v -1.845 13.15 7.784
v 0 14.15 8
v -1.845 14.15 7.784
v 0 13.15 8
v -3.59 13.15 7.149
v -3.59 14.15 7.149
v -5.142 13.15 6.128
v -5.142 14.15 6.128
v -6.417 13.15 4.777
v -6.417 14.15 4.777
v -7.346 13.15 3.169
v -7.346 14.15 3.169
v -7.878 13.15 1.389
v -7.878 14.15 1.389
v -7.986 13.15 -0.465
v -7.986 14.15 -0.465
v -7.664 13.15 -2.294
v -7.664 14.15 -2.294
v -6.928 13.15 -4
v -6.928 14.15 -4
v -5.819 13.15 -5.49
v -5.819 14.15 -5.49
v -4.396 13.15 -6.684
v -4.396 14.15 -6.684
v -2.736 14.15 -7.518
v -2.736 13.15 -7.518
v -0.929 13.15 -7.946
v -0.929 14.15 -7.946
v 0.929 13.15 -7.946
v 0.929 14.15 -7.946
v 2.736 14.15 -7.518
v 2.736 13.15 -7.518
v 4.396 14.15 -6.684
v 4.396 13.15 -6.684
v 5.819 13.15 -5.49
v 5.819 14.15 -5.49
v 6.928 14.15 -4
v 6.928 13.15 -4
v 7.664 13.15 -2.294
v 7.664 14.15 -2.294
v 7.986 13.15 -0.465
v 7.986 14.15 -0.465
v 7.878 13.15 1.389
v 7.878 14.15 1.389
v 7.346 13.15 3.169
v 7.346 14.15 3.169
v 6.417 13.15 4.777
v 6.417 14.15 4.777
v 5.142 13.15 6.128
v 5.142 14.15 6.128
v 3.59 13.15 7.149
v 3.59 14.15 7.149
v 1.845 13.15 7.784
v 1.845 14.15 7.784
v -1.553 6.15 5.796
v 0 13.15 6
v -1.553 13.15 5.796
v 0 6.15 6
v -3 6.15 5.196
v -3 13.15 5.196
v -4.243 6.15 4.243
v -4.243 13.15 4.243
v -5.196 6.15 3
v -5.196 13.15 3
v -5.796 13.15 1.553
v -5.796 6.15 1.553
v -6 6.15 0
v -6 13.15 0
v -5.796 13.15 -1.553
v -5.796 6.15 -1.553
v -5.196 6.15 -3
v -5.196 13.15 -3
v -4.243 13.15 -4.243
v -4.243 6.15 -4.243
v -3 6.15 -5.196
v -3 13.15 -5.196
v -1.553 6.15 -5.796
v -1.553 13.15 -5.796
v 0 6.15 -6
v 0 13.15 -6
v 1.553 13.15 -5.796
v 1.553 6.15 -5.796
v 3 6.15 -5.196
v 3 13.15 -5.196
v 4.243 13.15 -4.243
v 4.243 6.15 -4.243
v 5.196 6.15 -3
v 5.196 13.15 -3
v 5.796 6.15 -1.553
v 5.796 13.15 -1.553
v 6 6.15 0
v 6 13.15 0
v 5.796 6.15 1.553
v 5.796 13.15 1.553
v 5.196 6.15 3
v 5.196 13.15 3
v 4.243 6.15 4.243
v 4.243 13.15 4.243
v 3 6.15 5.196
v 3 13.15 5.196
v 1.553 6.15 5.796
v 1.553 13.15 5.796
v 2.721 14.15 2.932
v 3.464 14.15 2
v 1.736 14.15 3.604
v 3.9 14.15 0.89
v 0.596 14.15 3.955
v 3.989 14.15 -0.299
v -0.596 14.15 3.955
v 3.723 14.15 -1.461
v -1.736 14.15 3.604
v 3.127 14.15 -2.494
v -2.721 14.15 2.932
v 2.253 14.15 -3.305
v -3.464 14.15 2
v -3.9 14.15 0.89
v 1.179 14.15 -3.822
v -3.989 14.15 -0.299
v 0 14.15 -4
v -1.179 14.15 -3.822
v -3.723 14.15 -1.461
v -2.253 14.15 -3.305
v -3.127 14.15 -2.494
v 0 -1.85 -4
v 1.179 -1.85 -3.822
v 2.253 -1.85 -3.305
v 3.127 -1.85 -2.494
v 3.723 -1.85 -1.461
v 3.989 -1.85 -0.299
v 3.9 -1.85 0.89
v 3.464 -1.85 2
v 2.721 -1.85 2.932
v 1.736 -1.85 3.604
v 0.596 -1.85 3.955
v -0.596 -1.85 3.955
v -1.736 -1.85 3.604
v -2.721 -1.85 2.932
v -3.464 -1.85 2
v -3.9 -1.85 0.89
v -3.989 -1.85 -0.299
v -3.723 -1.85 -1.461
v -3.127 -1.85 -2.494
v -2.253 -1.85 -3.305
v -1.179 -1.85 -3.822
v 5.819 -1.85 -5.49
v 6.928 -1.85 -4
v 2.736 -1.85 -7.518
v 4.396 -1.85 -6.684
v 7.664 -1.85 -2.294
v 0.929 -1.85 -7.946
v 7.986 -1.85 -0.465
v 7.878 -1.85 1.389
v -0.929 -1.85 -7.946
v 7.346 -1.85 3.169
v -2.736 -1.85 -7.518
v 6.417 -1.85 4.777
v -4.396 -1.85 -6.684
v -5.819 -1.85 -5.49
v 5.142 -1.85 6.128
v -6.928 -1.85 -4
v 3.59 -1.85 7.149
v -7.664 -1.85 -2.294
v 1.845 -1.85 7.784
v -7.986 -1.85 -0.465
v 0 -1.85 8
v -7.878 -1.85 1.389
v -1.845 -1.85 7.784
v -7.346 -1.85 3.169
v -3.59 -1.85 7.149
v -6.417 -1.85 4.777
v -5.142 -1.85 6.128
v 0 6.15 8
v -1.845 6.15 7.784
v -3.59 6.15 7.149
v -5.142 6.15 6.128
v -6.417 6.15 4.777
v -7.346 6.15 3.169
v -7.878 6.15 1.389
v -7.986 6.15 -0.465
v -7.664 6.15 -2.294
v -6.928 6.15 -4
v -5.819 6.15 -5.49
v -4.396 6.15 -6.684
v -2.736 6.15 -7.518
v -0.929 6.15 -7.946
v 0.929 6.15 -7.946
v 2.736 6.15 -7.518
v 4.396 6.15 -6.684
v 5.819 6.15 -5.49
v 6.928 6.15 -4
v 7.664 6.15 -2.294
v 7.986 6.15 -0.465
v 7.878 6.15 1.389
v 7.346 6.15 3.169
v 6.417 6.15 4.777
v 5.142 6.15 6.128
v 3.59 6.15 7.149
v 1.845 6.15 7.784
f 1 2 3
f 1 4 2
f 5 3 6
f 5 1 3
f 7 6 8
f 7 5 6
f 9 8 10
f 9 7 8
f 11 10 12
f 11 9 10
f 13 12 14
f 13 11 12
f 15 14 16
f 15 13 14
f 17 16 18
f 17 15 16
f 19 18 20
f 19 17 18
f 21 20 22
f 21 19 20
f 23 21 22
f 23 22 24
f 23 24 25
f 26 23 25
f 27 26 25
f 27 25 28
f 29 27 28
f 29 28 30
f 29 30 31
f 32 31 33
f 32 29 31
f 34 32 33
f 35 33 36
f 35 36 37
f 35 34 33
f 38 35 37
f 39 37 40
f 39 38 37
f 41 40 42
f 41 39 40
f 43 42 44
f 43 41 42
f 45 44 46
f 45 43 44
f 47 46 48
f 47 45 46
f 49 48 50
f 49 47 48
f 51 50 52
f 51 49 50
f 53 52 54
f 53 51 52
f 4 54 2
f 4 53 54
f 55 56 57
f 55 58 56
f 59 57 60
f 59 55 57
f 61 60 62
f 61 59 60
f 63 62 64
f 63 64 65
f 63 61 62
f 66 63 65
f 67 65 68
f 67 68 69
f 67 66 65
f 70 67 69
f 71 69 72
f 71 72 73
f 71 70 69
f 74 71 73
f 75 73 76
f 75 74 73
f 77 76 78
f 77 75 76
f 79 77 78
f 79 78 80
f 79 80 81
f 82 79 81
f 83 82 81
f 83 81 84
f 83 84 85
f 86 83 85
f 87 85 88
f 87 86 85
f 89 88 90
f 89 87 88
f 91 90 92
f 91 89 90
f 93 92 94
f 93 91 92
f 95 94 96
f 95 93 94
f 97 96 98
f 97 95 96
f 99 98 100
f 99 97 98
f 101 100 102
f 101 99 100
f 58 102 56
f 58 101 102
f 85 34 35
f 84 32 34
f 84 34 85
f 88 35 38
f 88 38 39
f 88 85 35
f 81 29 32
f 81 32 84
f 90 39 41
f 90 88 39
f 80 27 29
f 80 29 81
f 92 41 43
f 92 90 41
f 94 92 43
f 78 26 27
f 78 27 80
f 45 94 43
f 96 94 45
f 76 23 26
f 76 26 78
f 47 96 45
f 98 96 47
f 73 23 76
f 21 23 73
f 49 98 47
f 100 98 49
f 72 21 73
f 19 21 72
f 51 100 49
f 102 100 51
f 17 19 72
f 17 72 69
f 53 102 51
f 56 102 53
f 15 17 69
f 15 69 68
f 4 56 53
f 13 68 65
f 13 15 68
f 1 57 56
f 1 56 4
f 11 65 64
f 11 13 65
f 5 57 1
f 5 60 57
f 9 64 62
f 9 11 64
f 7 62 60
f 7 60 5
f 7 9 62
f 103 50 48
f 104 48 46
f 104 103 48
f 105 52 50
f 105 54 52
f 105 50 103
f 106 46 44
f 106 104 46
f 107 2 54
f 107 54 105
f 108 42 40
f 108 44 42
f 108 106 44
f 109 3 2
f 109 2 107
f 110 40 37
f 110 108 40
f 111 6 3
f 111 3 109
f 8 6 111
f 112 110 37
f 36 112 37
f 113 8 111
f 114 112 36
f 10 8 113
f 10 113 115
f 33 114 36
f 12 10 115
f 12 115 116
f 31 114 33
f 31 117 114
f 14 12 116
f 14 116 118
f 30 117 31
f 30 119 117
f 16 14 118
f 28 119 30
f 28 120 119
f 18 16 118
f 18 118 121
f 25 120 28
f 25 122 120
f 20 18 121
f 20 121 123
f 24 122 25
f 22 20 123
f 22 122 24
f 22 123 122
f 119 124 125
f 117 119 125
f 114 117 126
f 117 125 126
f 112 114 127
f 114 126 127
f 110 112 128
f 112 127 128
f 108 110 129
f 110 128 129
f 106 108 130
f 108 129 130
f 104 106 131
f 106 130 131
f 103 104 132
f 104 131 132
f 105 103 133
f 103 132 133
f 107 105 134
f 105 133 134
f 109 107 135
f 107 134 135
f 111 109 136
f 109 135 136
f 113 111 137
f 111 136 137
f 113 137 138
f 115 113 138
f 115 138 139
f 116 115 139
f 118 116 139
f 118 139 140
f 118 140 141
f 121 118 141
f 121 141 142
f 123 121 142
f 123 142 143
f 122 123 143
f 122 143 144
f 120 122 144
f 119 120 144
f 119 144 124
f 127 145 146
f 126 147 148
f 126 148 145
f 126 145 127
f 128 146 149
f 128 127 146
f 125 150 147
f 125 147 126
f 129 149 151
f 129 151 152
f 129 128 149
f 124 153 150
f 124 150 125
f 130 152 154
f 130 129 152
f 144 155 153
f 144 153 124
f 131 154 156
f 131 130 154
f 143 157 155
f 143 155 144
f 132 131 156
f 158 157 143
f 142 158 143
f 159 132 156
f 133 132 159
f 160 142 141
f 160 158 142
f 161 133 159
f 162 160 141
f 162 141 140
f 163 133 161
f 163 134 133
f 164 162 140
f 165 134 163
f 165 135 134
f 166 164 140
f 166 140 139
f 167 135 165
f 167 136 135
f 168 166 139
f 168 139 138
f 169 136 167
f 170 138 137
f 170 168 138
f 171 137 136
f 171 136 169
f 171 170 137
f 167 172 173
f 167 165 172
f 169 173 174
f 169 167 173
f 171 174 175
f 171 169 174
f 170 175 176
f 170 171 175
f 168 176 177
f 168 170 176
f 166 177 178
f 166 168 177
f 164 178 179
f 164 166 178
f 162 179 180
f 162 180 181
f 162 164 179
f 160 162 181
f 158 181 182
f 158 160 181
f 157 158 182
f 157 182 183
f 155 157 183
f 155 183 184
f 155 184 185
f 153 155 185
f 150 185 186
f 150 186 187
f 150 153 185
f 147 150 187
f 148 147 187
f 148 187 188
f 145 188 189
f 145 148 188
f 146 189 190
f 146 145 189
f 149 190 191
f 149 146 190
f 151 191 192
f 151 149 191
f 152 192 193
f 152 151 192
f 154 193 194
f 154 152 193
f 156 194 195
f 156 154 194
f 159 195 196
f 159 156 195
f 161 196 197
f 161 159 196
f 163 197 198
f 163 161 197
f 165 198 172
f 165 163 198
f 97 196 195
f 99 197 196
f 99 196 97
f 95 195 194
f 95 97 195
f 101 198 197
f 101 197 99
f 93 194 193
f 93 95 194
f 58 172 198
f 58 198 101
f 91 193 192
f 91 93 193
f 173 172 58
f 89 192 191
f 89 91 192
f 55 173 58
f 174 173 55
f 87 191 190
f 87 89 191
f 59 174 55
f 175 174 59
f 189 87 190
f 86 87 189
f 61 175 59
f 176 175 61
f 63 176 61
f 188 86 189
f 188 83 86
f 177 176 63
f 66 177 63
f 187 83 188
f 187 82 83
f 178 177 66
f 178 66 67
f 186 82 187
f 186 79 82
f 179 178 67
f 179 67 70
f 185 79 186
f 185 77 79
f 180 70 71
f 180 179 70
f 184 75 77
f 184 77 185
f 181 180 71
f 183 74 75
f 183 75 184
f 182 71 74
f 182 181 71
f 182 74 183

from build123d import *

# Parameters (mm, degrees)
SKETCH_2_R          = 4
CUT_EXTRUDE_1_DEPTH = 20.595917942


with BuildPart() as part:
    # 草图1 → 旋转1 (revolve)
    with BuildSketch(Plane.XY, mode=Mode.PRIVATE) as revolve_1_sk:
        Polygon((0, 14.15), (-8, 14.15), (-8, 13.15), (-6, 13.15), (-6, 6.15), (-8, 6.15), (-8, -1.85), (0, -1.85), align=None)
    revolve(revolve_1_sk.sketch.rotate(Axis((0, 15.9, 0), (0, -1, 0)), 270), axis=Axis((0, 15.9, 0), (0, -1, 0)))

    # 草图2 → 切除-拉伸1 (cut, through all)
    with BuildSketch(Plane.XZ.offset(1.85)):
        with Locations(Location((0, 0, 0), (0, 0, 270))):
            Circle(SKETCH_2_R)
    extrude(amount=-CUT_EXTRUDE_1_DEPTH, mode=Mode.SUBTRACT)


solid = part.part
